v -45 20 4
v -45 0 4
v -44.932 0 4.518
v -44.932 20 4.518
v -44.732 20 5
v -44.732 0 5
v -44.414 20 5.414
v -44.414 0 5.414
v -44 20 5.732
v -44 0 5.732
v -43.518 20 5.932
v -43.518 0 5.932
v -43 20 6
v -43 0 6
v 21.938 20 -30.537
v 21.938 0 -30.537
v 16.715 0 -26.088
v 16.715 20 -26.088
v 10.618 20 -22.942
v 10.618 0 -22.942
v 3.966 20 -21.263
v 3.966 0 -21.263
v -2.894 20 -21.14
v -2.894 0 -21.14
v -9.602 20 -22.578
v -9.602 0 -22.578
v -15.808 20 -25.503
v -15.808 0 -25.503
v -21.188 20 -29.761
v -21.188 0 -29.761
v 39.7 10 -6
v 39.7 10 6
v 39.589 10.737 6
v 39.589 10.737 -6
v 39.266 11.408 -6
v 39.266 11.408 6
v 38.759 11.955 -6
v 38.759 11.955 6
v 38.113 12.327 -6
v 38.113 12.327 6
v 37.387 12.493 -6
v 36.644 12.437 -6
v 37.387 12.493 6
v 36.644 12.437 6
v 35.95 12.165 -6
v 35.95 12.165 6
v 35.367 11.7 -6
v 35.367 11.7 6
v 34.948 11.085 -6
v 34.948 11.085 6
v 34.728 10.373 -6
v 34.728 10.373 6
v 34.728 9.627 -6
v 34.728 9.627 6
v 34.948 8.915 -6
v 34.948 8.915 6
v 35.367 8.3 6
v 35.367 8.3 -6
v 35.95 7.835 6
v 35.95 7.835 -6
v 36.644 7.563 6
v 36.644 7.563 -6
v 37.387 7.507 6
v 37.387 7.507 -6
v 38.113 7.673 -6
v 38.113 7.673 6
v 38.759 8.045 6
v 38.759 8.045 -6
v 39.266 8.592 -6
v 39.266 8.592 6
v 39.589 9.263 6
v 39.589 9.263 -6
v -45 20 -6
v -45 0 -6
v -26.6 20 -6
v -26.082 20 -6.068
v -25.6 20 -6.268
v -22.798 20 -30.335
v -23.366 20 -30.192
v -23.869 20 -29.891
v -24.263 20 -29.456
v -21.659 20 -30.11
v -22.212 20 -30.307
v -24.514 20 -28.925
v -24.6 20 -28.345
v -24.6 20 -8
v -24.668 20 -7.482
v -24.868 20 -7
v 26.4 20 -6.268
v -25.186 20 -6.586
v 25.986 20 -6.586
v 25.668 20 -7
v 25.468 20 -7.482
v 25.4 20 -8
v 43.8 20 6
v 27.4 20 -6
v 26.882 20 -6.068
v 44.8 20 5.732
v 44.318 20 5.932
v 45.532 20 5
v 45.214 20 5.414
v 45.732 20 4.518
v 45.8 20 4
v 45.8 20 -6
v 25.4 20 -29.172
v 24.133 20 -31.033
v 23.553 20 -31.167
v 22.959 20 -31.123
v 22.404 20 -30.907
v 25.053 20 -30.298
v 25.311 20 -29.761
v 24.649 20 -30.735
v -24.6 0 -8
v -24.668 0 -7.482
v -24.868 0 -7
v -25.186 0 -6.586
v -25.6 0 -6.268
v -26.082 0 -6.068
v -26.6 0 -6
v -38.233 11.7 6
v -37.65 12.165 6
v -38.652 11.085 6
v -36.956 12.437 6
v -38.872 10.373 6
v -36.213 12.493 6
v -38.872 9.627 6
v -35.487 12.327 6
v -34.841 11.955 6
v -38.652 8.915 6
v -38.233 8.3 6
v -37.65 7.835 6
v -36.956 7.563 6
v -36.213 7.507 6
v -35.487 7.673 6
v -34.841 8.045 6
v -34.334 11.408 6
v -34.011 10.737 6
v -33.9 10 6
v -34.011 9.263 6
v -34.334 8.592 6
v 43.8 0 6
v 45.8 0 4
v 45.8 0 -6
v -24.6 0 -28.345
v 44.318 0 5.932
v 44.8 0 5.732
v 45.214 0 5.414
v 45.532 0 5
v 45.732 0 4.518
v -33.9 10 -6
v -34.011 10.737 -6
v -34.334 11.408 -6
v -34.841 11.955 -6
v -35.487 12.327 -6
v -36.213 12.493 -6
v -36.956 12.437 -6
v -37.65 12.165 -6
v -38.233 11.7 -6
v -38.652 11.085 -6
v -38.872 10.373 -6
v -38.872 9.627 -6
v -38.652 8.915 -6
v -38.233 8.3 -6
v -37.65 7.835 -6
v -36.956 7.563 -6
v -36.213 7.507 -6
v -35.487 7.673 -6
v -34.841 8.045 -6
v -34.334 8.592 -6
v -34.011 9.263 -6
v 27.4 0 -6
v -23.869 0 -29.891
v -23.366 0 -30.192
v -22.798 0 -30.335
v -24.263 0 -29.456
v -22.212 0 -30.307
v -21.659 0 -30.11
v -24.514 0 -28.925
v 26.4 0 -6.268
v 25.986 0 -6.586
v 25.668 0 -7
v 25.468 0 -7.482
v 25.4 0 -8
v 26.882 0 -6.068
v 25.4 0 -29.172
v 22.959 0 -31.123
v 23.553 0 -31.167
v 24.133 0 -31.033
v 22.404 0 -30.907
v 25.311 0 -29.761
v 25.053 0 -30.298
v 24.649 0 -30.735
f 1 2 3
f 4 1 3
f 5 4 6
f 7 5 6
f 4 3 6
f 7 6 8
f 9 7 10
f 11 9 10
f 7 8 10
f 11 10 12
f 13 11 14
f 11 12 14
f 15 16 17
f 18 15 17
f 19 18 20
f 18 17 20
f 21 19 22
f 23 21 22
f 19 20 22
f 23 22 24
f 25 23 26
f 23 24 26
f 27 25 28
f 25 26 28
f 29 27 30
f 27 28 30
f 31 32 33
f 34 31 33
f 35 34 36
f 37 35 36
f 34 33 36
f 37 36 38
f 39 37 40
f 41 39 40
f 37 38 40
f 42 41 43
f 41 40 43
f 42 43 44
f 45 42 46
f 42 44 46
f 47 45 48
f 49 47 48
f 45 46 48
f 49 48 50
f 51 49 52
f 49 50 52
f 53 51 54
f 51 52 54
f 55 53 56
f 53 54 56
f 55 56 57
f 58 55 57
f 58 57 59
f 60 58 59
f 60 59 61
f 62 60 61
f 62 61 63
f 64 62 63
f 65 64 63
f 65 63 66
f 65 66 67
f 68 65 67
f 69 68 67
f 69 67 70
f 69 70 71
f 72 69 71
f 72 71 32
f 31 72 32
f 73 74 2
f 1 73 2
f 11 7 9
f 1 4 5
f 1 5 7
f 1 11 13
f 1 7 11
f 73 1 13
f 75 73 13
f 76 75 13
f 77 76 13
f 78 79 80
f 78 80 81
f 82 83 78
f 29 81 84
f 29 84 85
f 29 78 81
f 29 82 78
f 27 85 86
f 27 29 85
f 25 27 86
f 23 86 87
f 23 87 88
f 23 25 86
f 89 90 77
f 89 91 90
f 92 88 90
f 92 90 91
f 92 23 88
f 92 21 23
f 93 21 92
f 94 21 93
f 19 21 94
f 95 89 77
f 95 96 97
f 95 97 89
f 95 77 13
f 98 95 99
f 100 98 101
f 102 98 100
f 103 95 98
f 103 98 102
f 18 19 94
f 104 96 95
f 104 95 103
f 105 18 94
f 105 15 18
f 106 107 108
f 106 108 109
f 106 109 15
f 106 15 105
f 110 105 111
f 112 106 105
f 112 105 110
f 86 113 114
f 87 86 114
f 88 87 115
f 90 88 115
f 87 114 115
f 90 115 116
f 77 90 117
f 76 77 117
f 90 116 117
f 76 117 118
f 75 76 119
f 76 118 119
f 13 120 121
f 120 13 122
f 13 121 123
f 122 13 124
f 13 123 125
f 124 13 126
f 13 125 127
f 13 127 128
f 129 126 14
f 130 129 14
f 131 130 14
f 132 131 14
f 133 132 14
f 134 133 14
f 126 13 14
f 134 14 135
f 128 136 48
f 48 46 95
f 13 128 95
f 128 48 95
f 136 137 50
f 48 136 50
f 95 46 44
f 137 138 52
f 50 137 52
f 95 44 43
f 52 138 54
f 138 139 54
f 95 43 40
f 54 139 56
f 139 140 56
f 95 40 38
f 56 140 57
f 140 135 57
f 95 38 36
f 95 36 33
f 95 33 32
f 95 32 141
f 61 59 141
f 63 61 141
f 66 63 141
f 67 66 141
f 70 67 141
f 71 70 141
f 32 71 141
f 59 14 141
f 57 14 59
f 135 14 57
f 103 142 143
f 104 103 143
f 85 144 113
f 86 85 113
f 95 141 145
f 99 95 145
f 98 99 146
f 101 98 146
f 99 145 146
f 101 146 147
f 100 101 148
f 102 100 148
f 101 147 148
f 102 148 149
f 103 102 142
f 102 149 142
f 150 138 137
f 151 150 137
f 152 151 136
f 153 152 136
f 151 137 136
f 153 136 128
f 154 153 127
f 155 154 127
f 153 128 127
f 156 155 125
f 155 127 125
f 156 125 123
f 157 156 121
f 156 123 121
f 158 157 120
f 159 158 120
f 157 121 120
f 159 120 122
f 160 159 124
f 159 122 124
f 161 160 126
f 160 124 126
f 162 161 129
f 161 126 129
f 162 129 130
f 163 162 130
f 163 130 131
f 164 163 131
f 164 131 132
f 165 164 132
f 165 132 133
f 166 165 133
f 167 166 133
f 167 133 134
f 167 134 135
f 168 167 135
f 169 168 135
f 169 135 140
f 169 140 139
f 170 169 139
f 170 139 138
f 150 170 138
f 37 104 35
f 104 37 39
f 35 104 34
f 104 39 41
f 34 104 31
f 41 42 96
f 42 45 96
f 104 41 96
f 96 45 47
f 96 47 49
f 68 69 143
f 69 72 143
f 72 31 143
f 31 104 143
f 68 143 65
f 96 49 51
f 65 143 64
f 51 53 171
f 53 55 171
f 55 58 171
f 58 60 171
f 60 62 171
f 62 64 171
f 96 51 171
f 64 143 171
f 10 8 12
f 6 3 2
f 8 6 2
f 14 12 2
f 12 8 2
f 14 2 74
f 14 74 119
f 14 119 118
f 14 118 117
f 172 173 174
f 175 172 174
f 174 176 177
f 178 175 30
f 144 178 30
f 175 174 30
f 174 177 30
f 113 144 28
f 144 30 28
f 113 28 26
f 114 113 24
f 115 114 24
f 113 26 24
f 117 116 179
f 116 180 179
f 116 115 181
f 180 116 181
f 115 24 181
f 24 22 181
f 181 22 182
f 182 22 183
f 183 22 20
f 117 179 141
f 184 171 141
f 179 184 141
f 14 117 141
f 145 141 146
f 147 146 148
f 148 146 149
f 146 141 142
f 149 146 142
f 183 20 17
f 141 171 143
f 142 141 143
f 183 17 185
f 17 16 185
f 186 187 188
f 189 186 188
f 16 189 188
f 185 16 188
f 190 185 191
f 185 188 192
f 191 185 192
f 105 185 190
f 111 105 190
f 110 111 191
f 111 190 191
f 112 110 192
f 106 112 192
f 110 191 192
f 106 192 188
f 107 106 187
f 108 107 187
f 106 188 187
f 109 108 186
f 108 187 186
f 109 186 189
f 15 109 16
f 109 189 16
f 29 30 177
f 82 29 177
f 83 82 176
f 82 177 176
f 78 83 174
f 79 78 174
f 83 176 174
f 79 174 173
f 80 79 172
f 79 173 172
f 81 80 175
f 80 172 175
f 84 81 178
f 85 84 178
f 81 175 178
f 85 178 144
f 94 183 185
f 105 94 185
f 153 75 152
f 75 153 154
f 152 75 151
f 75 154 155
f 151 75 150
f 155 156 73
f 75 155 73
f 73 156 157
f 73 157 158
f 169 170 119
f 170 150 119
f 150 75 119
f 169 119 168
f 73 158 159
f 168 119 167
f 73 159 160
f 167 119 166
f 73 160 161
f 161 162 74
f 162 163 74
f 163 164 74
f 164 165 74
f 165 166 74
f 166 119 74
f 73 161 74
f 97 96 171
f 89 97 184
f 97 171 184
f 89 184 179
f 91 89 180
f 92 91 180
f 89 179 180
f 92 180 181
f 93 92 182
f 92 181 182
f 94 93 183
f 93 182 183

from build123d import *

# Parameters (mm, degrees)
BOSS_EXTRUDE1_DEPTH = 20
CUT_EXTRUDE1_REACH  = 64.285
SKETCH3_R           = 2.5


with BuildPart() as part:
    # Sketch2 → Boss-Extrude1 (new body)
    with BuildSketch(Plane(origin=(0, 0, 0), x_dir=(1, 0, 0), z_dir=(0, 1, 0))):
        with BuildLine():
            Line((-24.6, 28.345199184), (-24.6, 8))
            ThreePointArc((-24.6, 8), (-25.185786438, 6.585786438), (-26.6, 6))
            Line((-26.6, 6), (-45, 6))
            Line((-45, 6), (-45, -4))
            ThreePointArc((-45, -4), (-44.414213562, -5.414213562), (-43, -6))
            Line((-43, -6), (43.8, -6))
            ThreePointArc((43.8, -6), (45.214213562, -5.414213562), (45.8, -4))
            Line((45.8, -4), (45.8, 6))
            Line((45.8, 6), (27.4, 6))
            ThreePointArc((27.4, 6), (25.985786438, 6.585786438), (25.4, 8))
            Line((25.4, 8), (25.4, 29.172494416))
            ThreePointArc((25.4, 29.172494416), (24.133143915, 31.033273823), (21.9375, 30.536713515))
            ThreePointArc((21.9375, 30.536713515), (0.539453133, 21.004850554), (-21.1875, 29.761124235))
            ThreePointArc((-21.1875, 29.761124235), (-23.366485486, 30.192494504), (-24.6, 28.345199184))
        make_face()
    extrude(amount=BOSS_EXTRUDE1_DEPTH)

    # Sketch3 → Cut-Extrude1 (cut, up to next)
    with BuildSketch(Plane.XY.offset(6), mode=Mode.PRIVATE) as cut_extrude1_sk1:
        with Locations((-36.4, 10)):
            Circle(SKETCH3_R)
    cut_extrude1_tool1 = extrude(cut_extrude1_sk1.sketch, amount=-CUT_EXTRUDE1_REACH, mode=Mode.PRIVATE) & part.part
    # Sketch3 → Cut-Extrude1 (cut, up to next)
    with BuildSketch(Plane.XY.offset(6), mode=Mode.PRIVATE) as cut_extrude1_sk2:
        with Locations((37.2, 10)):
            Circle(SKETCH3_R)
    cut_extrude1_tool2 = extrude(cut_extrude1_sk2.sketch, amount=-CUT_EXTRUDE1_REACH, mode=Mode.PRIVATE) & part.part
    add(cut_extrude1_tool1.solids().sort_by_distance((-36.4, 10, 6))[0], mode=Mode.SUBTRACT)
    add(cut_extrude1_tool2.solids().sort_by_distance((37.2, 10, 6))[0], mode=Mode.SUBTRACT)


solid = part.part
